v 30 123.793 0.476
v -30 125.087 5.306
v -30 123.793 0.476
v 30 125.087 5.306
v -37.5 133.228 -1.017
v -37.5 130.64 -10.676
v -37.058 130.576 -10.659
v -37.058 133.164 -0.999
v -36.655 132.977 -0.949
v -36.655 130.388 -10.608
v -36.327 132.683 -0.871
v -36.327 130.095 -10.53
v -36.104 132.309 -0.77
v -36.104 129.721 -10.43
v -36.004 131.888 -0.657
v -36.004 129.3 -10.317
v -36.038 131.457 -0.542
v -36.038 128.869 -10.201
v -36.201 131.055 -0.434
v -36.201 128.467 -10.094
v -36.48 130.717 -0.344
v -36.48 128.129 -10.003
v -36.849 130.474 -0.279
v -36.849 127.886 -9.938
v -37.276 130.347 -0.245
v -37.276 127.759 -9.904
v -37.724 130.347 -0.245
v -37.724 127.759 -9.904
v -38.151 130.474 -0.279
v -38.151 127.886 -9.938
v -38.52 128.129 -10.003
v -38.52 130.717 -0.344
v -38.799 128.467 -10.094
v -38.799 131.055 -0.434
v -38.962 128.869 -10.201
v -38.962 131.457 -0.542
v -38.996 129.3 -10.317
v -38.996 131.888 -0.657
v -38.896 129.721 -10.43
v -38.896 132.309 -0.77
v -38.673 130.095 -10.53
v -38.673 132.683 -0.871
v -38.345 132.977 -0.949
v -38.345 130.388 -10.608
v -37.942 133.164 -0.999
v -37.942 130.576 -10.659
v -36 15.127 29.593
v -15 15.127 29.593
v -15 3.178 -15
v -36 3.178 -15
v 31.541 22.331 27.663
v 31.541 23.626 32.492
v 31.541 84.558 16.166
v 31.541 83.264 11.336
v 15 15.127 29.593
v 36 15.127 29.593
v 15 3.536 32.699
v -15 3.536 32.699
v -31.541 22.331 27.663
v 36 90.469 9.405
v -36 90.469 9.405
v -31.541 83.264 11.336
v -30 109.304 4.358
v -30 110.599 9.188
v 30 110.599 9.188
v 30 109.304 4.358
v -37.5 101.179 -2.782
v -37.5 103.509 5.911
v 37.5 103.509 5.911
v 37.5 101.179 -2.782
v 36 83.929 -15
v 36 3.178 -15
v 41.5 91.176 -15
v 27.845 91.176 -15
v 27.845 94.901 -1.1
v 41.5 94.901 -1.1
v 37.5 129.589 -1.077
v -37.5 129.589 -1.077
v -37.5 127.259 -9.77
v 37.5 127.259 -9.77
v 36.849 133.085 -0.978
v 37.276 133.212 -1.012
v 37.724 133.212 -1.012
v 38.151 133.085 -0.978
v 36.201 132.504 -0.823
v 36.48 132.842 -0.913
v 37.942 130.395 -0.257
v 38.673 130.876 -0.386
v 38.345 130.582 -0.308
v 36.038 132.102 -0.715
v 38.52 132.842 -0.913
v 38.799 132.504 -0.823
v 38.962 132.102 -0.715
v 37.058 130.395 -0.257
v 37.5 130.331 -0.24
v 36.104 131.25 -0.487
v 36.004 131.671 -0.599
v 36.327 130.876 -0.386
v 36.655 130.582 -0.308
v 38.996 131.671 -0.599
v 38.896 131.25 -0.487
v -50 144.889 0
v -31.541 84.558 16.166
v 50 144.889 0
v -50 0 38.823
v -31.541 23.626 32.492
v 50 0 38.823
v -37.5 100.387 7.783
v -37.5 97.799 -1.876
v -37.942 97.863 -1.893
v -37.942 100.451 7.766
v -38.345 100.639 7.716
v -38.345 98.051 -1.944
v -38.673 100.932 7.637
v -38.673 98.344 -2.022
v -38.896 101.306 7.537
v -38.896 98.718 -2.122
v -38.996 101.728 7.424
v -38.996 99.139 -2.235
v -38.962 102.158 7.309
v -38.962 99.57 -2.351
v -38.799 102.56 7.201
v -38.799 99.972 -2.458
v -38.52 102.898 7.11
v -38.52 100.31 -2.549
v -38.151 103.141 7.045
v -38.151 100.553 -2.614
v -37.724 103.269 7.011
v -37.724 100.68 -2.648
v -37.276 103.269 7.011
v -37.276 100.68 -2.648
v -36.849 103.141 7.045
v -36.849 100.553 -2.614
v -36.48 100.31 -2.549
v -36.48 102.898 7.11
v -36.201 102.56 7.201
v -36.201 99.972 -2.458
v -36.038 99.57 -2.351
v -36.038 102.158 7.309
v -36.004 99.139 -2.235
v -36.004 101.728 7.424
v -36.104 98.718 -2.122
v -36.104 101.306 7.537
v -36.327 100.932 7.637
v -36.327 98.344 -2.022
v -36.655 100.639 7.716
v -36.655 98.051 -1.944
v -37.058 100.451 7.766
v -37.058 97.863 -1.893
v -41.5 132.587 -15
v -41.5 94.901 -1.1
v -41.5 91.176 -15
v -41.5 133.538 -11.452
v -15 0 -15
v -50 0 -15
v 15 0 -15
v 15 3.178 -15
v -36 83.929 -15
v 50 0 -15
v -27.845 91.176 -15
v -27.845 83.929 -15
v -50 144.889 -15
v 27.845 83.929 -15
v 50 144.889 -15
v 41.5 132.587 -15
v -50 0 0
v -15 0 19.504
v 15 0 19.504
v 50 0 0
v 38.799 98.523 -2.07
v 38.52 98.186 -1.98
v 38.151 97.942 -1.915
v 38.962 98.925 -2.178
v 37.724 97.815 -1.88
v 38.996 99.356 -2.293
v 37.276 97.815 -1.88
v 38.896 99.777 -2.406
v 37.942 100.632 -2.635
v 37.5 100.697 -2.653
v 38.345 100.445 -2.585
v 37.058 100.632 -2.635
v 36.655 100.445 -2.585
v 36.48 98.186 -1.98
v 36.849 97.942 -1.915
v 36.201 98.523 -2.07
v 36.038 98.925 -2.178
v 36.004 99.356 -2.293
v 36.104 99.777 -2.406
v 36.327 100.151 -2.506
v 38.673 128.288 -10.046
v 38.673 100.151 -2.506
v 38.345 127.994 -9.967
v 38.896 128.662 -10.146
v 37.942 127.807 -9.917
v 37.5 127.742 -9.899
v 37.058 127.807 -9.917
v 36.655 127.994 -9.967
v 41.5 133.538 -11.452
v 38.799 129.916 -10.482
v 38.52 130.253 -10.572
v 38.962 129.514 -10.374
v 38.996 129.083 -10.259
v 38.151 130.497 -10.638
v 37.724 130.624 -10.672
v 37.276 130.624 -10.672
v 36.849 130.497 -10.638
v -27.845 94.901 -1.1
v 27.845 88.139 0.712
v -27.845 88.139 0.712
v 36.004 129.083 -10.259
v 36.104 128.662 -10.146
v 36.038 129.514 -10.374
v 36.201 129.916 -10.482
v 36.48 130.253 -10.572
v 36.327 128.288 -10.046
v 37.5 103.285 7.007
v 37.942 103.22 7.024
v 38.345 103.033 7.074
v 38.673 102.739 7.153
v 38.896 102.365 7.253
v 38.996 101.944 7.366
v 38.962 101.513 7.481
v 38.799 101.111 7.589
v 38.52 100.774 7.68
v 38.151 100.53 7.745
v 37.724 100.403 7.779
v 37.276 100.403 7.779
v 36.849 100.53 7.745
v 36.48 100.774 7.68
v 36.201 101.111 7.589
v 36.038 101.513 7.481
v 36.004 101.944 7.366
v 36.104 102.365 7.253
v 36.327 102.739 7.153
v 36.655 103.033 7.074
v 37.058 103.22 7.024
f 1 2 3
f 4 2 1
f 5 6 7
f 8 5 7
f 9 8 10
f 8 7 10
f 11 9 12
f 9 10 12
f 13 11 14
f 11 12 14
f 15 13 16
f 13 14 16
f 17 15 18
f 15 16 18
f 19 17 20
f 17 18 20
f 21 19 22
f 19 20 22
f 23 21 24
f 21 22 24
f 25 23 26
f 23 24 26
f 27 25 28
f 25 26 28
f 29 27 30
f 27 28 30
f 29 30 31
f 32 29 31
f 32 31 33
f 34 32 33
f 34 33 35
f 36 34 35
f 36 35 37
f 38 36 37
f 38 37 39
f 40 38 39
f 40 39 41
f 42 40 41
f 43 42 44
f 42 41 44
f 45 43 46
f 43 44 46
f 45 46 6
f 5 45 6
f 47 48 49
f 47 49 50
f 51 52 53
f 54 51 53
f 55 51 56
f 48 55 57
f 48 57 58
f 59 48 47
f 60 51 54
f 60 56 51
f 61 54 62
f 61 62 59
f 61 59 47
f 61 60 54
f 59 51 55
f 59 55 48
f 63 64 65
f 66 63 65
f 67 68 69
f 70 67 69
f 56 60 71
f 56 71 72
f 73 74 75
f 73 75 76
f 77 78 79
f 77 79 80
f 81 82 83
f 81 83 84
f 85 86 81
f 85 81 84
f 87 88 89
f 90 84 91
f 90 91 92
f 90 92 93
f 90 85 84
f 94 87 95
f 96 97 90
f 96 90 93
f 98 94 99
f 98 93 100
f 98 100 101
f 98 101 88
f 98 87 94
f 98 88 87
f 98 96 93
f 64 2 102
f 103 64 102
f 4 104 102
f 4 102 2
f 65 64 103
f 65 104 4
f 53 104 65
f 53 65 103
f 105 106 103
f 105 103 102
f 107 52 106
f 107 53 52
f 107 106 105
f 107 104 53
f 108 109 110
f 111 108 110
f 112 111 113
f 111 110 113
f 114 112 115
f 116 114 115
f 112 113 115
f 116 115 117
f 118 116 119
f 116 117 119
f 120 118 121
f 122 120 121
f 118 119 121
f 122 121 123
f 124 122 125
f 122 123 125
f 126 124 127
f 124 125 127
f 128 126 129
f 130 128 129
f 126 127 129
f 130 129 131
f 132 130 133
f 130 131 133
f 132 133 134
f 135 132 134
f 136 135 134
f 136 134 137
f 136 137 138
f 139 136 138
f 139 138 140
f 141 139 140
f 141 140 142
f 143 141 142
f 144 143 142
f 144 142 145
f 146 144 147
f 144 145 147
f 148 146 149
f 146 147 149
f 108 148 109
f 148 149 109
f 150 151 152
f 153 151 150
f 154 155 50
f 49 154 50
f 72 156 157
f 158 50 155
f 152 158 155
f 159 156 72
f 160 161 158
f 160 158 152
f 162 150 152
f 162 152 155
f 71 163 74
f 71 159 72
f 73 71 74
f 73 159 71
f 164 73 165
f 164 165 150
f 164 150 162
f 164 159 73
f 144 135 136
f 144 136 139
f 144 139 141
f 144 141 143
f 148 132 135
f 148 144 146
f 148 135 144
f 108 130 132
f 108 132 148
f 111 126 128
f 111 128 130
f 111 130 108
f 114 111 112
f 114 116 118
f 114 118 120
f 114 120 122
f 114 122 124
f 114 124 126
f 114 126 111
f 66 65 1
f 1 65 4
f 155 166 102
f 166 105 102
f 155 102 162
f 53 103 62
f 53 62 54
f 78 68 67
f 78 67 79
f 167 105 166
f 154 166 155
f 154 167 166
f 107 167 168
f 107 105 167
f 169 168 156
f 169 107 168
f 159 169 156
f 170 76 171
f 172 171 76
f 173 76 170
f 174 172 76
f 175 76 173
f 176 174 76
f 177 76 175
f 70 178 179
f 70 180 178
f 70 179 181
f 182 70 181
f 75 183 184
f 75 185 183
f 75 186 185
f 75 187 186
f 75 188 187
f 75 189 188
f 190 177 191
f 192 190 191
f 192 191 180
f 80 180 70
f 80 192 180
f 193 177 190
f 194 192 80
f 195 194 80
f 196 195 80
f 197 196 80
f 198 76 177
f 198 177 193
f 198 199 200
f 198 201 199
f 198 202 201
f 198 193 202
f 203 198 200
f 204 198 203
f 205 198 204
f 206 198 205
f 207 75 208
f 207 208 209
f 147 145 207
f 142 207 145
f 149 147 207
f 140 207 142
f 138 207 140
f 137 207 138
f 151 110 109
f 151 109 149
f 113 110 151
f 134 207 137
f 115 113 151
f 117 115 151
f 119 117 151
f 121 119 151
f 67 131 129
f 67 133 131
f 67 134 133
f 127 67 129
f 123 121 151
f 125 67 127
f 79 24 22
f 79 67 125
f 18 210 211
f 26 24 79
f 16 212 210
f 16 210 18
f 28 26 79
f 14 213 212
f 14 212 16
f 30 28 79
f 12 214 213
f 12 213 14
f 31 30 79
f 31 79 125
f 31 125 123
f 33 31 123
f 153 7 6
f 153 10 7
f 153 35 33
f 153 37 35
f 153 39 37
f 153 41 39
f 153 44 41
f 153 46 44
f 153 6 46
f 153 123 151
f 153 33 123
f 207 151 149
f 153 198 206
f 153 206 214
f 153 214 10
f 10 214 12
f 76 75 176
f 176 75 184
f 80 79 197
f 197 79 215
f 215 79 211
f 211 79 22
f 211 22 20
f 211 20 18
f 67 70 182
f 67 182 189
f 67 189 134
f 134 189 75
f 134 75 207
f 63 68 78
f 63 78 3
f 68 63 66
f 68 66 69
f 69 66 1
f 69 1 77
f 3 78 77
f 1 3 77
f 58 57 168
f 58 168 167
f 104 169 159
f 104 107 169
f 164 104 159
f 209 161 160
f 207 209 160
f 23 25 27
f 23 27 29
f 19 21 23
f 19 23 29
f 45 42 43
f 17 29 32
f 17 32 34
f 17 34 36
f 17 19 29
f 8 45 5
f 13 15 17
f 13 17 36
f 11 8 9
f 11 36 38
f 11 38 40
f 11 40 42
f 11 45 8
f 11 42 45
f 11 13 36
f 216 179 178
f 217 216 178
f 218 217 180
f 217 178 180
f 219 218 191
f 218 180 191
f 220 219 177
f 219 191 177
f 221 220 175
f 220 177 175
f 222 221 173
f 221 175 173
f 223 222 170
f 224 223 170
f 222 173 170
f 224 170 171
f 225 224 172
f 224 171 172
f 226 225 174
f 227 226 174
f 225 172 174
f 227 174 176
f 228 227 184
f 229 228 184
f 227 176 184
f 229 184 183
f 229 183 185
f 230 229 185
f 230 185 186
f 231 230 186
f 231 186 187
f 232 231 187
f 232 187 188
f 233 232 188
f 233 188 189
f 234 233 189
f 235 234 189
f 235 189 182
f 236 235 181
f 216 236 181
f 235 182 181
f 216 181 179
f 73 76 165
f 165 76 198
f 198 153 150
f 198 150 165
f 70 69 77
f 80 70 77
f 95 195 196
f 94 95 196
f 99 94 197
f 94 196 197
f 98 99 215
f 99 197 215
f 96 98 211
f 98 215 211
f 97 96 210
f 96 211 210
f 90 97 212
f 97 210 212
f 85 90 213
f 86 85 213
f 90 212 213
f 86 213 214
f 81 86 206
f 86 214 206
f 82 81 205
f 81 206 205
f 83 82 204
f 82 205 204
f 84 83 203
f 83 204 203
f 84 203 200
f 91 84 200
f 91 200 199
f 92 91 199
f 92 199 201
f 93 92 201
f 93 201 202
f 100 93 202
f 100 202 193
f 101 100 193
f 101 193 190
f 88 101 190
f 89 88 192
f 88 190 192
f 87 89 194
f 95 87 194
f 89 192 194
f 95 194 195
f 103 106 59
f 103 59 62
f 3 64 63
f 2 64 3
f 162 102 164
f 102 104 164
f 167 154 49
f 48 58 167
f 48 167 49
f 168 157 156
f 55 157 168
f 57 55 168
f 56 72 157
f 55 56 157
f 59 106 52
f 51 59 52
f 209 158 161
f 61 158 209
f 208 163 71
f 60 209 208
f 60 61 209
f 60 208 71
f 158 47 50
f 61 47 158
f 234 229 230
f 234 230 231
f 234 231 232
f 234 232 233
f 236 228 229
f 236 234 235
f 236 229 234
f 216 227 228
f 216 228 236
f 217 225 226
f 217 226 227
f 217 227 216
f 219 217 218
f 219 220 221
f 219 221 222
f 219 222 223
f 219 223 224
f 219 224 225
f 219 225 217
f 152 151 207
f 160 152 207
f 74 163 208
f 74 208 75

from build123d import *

# Parameters (mm, degrees)
BOSS_EXTRUDE1_DEPTH = 50
SKETCH5_W           = 15
SKETCH5_H           = 144.888873943
BOSS_EXTRUDE2_DEPTH = 50
SKETCH3_W           = 63.082028678
SKETCH3_H           = 63.082028678
SKETCH3_W_2         = 60
SKETCH3_H_2         = 15
CUT_EXTRUDE1_DEPTH  = 153.964709483
CUT_EXTRUDE2_START  = -5
SKETCH4_W           = 75
SKETCH4_H           = 27
CUT_EXTRUDE2_DEPTH  = 148.964709483
CUT_EXTRUDE3_START  = -14
SKETCH6_W           = 83
SKETCH6_H           = 40
CUT_EXTRUDE3_DEPTH  = 100
SKETCH7_R           = 1.5
CUT_EXTRUDE4_DEPTH  = 10
SKETCH8_W           = 55.690082514
SKETCH8_H           = 14
CUT_EXTRUDE5_DEPTH  = 153.277751166


with BuildPart() as part:
    # Sketch1 → Boss-Extrude1 (new, symmetric)
    with BuildSketch(Plane(origin=(0, 0, 0), x_dir=(0, 0, -1), z_dir=(1, 0, 0))):
        Polygon((0, 0), (0, 144.888873943), (-38.822856765, 0), align=None)
    extrude(amount=BOSS_EXTRUDE1_DEPTH, both=True)

    # Sketch5 → Boss-Extrude2 (add, symmetric)
    with BuildSketch(Plane(origin=(0, 0, 0), x_dir=(0, 0, -1), z_dir=(1, 0, 0))):
        with Locations((7.5, 72.444436972)):
            Rectangle(SKETCH5_W, SKETCH5_H)
    extrude(amount=BOSS_EXTRUDE2_DEPTH, both=True)

    # Sketch3 → Cut-Extrude1 (cut, through all)
    with BuildSketch(Plane(origin=(0, 9.705714191, 36.222218486), x_dir=(1, 0, 0), z_dir=(0, 0.25881904510251436, 0.96592582628907))):
        with Locations((0, 45.951905284)):
            Rectangle(SKETCH3_W, SKETCH3_H)
        with Locations((0, 111.951905284)):
            Rectangle(SKETCH3_W_2, SKETCH3_H_2)
    extrude(amount=-CUT_EXTRUDE1_DEPTH, mode=Mode.SUBTRACT)

    # Sketch4 → Cut-Extrude2 (cut, through all)
    with BuildSketch(Plane(origin=(0, 9.705714191, 36.222218486), x_dir=(1, 0, 0), z_dir=(0, 0.25881904510251436, 0.96592582628907)).offset(CUT_EXTRUDE2_START)):
        Polygon((-36, 84.951905284), (36, 84.951905284), (36, 6.951905284), (15, 6.951905284), (15, -5.048094716), (-15, -5.048094716), (-15, 6.951905284), (-36, 6.951905284), align=None)
        with Locations((0, 111.951905284)):
            Rectangle(SKETCH4_W, SKETCH4_H)
    extrude(amount=-CUT_EXTRUDE2_DEPTH, mode=Mode.SUBTRACT)

    # Sketch6 → Cut-Extrude3 (cut)
    with BuildSketch(Plane(origin=(0, 9.705714191, 36.222218486), x_dir=(1, 0, 0), z_dir=(0, 0.25881904510251436, 0.96592582628907)).offset(CUT_EXTRUDE3_START)):
        with Locations((0, 111.951905284)):
            Rectangle(SKETCH6_W, SKETCH6_H)
    extrude(amount=-CUT_EXTRUDE3_DEPTH, mode=Mode.SUBTRACT)

    # Sketch7 → Cut-Extrude4 (cut)
    with BuildSketch(Plane(origin=(0, 6.08224756, 22.699256918), x_dir=(-1, 0, 0), z_dir=(0, -0.25881904510251436, -0.96592582628907))):
        with Locations(Location((37.5, 127.451905284, 0), (0, 0, 90))):
            Circle(SKETCH7_R)
        with Locations(Location((-37.5, 127.451905284, 0), (0, 0, 270))):
            Circle(SKETCH7_R)
        with Locations(Location((37.5, 96.451905284, 0), (0, 0, 270))):
            Circle(SKETCH7_R)
        with Locations(Location((-37.5, 96.451905284, 0), (0, 0, 90))):
            Circle(SKETCH7_R)
    extrude(amount=-CUT_EXTRUDE4_DEPTH, mode=Mode.SUBTRACT)

    # Sketch8 → Cut-Extrude5 (cut, through all)
    with BuildSketch(Plane(origin=(0, 6.08224756, 22.699256918), x_dir=(-1, 0, 0), z_dir=(0, -0.25881904510251436, -0.96592582628907))):
        with Locations((0, 91.951905284)):
            Rectangle(SKETCH8_W, SKETCH8_H)
    extrude(amount=CUT_EXTRUDE5_DEPTH, mode=Mode.SUBTRACT)


solid = part.part
